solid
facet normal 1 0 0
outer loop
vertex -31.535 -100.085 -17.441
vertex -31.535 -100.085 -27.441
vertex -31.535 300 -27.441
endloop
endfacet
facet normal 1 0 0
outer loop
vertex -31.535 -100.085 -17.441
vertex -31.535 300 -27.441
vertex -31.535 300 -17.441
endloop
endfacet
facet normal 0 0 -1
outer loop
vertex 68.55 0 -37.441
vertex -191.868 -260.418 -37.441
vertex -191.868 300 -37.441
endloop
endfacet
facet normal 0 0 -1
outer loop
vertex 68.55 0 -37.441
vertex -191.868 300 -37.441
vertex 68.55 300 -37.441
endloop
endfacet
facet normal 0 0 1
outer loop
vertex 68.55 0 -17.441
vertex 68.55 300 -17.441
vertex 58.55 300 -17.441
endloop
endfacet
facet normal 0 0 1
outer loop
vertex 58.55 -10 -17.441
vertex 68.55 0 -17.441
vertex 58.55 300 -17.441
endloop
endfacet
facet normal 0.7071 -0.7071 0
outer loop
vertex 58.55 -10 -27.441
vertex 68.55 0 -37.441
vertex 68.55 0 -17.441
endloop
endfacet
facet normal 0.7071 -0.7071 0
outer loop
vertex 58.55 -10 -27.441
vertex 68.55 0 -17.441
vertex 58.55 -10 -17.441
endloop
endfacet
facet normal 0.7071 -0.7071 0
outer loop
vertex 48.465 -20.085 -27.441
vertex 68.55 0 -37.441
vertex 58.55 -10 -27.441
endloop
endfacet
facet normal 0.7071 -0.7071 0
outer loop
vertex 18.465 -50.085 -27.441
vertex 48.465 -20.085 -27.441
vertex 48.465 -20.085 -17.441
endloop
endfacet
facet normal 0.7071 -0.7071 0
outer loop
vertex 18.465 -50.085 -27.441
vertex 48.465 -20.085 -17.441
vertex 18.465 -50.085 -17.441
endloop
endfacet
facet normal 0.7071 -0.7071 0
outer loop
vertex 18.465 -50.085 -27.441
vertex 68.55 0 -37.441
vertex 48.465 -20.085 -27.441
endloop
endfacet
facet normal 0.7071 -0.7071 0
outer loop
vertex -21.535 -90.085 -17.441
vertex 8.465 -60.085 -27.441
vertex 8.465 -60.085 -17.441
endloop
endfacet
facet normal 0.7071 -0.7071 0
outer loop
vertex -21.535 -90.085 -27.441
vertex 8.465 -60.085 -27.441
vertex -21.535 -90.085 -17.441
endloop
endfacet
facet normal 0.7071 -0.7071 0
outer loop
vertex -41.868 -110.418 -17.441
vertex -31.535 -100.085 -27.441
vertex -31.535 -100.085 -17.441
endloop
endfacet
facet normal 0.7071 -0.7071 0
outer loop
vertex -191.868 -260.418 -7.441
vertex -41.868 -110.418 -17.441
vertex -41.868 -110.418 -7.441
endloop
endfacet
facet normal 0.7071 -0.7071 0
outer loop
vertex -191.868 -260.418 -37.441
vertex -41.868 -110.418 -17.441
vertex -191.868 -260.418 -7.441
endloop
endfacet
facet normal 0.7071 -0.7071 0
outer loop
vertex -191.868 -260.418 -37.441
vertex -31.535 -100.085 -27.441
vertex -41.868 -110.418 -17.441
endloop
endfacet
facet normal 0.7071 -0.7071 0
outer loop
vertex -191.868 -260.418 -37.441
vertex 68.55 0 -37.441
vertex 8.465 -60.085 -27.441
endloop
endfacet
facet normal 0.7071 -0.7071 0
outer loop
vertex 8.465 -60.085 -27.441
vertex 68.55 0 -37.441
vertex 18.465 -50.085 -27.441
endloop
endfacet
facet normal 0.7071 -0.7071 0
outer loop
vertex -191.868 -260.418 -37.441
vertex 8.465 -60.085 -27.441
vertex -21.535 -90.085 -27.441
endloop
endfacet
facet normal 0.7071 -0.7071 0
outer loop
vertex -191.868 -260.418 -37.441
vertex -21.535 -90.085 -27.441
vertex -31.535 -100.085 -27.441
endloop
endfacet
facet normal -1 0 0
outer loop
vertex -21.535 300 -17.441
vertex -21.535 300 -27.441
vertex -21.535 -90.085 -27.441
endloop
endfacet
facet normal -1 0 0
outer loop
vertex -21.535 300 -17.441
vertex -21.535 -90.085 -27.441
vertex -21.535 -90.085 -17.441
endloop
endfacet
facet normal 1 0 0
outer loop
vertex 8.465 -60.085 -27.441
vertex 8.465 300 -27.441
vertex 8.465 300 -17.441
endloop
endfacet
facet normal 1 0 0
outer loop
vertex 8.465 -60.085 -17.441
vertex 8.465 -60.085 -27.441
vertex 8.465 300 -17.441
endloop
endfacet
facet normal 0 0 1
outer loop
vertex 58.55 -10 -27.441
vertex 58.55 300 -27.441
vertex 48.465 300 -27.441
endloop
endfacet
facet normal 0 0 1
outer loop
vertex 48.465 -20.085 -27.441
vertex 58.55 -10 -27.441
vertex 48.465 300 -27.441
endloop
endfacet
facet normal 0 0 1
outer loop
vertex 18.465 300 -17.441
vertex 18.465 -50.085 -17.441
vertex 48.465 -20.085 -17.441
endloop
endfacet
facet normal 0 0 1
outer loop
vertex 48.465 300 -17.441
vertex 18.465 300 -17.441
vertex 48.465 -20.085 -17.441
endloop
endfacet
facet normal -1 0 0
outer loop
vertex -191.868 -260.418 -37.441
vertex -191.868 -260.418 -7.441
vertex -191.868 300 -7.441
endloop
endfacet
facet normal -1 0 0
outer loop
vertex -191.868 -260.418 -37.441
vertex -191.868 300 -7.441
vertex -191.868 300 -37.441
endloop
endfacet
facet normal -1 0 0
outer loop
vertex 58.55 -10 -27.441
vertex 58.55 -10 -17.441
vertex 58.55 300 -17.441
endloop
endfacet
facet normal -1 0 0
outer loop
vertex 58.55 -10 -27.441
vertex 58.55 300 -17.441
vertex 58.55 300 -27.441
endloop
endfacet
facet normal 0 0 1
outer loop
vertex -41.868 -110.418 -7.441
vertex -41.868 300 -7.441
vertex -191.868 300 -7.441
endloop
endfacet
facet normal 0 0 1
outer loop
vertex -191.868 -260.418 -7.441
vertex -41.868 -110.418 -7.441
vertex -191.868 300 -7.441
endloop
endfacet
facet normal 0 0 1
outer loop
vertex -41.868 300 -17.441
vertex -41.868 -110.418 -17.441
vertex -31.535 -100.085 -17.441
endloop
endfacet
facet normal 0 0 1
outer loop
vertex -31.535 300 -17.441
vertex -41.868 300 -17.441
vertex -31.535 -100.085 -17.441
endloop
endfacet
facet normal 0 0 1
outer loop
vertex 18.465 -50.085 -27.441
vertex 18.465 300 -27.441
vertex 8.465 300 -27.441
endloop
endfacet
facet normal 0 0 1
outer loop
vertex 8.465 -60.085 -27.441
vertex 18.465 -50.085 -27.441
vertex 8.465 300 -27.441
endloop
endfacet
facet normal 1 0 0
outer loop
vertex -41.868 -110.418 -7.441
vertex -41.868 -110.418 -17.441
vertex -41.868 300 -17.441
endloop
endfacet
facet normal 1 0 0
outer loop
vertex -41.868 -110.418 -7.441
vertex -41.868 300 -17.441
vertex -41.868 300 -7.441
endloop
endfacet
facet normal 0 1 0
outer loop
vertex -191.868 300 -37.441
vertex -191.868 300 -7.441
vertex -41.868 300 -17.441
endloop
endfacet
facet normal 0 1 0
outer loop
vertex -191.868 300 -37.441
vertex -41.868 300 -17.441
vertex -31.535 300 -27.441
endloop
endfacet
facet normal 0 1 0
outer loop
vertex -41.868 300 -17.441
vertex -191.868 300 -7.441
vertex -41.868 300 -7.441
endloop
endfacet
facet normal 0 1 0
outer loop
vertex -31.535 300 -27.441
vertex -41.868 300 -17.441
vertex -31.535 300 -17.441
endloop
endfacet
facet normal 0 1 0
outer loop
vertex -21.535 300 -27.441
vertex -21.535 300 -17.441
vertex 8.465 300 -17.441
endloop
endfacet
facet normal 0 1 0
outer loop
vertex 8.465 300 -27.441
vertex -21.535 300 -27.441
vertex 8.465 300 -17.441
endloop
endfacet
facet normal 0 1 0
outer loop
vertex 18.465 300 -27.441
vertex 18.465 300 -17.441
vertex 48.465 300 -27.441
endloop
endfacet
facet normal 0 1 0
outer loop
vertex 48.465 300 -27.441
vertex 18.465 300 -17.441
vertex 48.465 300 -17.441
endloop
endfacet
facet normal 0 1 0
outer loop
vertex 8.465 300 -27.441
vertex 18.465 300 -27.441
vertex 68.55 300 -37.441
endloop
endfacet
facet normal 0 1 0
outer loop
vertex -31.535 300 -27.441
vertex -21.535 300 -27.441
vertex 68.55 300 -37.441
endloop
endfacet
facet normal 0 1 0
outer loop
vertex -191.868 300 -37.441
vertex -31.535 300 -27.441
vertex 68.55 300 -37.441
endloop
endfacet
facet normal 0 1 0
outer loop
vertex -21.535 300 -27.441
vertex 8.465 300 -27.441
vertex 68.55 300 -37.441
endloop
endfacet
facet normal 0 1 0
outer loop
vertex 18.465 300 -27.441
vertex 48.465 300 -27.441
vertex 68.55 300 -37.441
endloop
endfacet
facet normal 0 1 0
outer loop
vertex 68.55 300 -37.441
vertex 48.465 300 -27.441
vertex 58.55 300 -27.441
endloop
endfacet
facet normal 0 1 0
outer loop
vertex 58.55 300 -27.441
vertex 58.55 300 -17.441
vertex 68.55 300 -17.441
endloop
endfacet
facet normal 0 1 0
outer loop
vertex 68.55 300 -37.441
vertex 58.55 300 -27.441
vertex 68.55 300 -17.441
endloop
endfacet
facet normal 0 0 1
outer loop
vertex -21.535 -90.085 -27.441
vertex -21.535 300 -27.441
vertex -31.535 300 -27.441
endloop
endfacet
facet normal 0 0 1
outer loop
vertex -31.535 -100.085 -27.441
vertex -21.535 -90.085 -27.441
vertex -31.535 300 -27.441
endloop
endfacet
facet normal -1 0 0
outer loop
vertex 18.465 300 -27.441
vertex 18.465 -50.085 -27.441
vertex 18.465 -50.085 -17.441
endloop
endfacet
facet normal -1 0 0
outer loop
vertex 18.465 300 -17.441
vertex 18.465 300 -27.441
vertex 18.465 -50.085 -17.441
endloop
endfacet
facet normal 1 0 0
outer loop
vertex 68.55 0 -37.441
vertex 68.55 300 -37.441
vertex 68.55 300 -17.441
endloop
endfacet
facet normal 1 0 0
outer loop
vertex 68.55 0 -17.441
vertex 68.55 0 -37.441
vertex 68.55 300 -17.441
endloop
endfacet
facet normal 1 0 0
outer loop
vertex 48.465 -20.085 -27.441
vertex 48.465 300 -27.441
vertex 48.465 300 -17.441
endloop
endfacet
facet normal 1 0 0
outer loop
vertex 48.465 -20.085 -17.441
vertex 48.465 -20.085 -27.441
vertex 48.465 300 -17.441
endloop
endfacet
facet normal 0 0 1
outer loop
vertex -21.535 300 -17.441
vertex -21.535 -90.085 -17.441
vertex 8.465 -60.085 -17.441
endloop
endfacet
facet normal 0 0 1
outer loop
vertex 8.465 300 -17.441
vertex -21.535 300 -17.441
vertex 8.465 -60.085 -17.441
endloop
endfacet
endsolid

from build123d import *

# Parameters (mm, degrees)
F0_W        = 30
F0_H        = 10
F0_W_2      = 10.3326633751
F1_DEPTH    = 300
F2_T1_DEPTH = 1563.0097927795


# Not quite as in the source:
# - a fillet or chamfer that OpenCascade refuses, or shapes differently, is made with other operations: its cross-section is extruded or revolved along the edge and cut away or added


with BuildPart() as f1:
    # F0 (on Front) → F1 (new body, symmetric)
    with BuildSketch(Plane.XZ):
        Polygon((-41.8675842226, -17.4409984683), (-41.8675842226, -7.4409984683), (-191.8675842226, -7.4409984683), (-191.8675842226, -37.4409984683), (-41.8675842226, -37.4409984683), (-41.8675842226, -27.4409984683), align=None)
        with Locations((33.4650791525, -22.4409984683)):
            Rectangle(F0_W, F0_H)
        with Locations((-36.7012525351, -22.4409984683)):
            Rectangle(F0_W_2, F0_H)
        with Locations((-6.5349208475, -22.4409984683)):
            Rectangle(F0_W, F0_H)
        Polygon((-31.5349208475, -27.4409984683), (-41.8675842226, -27.4409984683), (-41.8675842226, -37.4409984683), (58.5501386541, -37.4409984683), (58.5501386541, -27.4409984683), (48.4650791525, -27.4409984683), (18.4650791525, -27.4409984683), (8.4650791525, -27.4409984683), (-21.5349208475, -27.4409984683), align=None)
        Polygon((58.5501386541, -27.4409984683), (58.5501386541, -37.4409984683), (68.5501386541, -37.4409984683), (68.5501386541, -17.4409984683), (58.5501386541, -17.4409984683), align=None)
    extrude(amount=F1_DEPTH, both=True)

    # F2: chamfer of 300 on 1 edges, made by hand

    # F2_s2 → F2_t1 (cut)
    with BuildSketch(Plane.XY.offset(-808.945894858)):
        Polygon((68.5501386541, 0), (-231.4498613459, -300), (68.5501386541, -300), align=None)
    extrude(amount=F2_T1_DEPTH, mode=Mode.SUBTRACT)


solid = f1.part
